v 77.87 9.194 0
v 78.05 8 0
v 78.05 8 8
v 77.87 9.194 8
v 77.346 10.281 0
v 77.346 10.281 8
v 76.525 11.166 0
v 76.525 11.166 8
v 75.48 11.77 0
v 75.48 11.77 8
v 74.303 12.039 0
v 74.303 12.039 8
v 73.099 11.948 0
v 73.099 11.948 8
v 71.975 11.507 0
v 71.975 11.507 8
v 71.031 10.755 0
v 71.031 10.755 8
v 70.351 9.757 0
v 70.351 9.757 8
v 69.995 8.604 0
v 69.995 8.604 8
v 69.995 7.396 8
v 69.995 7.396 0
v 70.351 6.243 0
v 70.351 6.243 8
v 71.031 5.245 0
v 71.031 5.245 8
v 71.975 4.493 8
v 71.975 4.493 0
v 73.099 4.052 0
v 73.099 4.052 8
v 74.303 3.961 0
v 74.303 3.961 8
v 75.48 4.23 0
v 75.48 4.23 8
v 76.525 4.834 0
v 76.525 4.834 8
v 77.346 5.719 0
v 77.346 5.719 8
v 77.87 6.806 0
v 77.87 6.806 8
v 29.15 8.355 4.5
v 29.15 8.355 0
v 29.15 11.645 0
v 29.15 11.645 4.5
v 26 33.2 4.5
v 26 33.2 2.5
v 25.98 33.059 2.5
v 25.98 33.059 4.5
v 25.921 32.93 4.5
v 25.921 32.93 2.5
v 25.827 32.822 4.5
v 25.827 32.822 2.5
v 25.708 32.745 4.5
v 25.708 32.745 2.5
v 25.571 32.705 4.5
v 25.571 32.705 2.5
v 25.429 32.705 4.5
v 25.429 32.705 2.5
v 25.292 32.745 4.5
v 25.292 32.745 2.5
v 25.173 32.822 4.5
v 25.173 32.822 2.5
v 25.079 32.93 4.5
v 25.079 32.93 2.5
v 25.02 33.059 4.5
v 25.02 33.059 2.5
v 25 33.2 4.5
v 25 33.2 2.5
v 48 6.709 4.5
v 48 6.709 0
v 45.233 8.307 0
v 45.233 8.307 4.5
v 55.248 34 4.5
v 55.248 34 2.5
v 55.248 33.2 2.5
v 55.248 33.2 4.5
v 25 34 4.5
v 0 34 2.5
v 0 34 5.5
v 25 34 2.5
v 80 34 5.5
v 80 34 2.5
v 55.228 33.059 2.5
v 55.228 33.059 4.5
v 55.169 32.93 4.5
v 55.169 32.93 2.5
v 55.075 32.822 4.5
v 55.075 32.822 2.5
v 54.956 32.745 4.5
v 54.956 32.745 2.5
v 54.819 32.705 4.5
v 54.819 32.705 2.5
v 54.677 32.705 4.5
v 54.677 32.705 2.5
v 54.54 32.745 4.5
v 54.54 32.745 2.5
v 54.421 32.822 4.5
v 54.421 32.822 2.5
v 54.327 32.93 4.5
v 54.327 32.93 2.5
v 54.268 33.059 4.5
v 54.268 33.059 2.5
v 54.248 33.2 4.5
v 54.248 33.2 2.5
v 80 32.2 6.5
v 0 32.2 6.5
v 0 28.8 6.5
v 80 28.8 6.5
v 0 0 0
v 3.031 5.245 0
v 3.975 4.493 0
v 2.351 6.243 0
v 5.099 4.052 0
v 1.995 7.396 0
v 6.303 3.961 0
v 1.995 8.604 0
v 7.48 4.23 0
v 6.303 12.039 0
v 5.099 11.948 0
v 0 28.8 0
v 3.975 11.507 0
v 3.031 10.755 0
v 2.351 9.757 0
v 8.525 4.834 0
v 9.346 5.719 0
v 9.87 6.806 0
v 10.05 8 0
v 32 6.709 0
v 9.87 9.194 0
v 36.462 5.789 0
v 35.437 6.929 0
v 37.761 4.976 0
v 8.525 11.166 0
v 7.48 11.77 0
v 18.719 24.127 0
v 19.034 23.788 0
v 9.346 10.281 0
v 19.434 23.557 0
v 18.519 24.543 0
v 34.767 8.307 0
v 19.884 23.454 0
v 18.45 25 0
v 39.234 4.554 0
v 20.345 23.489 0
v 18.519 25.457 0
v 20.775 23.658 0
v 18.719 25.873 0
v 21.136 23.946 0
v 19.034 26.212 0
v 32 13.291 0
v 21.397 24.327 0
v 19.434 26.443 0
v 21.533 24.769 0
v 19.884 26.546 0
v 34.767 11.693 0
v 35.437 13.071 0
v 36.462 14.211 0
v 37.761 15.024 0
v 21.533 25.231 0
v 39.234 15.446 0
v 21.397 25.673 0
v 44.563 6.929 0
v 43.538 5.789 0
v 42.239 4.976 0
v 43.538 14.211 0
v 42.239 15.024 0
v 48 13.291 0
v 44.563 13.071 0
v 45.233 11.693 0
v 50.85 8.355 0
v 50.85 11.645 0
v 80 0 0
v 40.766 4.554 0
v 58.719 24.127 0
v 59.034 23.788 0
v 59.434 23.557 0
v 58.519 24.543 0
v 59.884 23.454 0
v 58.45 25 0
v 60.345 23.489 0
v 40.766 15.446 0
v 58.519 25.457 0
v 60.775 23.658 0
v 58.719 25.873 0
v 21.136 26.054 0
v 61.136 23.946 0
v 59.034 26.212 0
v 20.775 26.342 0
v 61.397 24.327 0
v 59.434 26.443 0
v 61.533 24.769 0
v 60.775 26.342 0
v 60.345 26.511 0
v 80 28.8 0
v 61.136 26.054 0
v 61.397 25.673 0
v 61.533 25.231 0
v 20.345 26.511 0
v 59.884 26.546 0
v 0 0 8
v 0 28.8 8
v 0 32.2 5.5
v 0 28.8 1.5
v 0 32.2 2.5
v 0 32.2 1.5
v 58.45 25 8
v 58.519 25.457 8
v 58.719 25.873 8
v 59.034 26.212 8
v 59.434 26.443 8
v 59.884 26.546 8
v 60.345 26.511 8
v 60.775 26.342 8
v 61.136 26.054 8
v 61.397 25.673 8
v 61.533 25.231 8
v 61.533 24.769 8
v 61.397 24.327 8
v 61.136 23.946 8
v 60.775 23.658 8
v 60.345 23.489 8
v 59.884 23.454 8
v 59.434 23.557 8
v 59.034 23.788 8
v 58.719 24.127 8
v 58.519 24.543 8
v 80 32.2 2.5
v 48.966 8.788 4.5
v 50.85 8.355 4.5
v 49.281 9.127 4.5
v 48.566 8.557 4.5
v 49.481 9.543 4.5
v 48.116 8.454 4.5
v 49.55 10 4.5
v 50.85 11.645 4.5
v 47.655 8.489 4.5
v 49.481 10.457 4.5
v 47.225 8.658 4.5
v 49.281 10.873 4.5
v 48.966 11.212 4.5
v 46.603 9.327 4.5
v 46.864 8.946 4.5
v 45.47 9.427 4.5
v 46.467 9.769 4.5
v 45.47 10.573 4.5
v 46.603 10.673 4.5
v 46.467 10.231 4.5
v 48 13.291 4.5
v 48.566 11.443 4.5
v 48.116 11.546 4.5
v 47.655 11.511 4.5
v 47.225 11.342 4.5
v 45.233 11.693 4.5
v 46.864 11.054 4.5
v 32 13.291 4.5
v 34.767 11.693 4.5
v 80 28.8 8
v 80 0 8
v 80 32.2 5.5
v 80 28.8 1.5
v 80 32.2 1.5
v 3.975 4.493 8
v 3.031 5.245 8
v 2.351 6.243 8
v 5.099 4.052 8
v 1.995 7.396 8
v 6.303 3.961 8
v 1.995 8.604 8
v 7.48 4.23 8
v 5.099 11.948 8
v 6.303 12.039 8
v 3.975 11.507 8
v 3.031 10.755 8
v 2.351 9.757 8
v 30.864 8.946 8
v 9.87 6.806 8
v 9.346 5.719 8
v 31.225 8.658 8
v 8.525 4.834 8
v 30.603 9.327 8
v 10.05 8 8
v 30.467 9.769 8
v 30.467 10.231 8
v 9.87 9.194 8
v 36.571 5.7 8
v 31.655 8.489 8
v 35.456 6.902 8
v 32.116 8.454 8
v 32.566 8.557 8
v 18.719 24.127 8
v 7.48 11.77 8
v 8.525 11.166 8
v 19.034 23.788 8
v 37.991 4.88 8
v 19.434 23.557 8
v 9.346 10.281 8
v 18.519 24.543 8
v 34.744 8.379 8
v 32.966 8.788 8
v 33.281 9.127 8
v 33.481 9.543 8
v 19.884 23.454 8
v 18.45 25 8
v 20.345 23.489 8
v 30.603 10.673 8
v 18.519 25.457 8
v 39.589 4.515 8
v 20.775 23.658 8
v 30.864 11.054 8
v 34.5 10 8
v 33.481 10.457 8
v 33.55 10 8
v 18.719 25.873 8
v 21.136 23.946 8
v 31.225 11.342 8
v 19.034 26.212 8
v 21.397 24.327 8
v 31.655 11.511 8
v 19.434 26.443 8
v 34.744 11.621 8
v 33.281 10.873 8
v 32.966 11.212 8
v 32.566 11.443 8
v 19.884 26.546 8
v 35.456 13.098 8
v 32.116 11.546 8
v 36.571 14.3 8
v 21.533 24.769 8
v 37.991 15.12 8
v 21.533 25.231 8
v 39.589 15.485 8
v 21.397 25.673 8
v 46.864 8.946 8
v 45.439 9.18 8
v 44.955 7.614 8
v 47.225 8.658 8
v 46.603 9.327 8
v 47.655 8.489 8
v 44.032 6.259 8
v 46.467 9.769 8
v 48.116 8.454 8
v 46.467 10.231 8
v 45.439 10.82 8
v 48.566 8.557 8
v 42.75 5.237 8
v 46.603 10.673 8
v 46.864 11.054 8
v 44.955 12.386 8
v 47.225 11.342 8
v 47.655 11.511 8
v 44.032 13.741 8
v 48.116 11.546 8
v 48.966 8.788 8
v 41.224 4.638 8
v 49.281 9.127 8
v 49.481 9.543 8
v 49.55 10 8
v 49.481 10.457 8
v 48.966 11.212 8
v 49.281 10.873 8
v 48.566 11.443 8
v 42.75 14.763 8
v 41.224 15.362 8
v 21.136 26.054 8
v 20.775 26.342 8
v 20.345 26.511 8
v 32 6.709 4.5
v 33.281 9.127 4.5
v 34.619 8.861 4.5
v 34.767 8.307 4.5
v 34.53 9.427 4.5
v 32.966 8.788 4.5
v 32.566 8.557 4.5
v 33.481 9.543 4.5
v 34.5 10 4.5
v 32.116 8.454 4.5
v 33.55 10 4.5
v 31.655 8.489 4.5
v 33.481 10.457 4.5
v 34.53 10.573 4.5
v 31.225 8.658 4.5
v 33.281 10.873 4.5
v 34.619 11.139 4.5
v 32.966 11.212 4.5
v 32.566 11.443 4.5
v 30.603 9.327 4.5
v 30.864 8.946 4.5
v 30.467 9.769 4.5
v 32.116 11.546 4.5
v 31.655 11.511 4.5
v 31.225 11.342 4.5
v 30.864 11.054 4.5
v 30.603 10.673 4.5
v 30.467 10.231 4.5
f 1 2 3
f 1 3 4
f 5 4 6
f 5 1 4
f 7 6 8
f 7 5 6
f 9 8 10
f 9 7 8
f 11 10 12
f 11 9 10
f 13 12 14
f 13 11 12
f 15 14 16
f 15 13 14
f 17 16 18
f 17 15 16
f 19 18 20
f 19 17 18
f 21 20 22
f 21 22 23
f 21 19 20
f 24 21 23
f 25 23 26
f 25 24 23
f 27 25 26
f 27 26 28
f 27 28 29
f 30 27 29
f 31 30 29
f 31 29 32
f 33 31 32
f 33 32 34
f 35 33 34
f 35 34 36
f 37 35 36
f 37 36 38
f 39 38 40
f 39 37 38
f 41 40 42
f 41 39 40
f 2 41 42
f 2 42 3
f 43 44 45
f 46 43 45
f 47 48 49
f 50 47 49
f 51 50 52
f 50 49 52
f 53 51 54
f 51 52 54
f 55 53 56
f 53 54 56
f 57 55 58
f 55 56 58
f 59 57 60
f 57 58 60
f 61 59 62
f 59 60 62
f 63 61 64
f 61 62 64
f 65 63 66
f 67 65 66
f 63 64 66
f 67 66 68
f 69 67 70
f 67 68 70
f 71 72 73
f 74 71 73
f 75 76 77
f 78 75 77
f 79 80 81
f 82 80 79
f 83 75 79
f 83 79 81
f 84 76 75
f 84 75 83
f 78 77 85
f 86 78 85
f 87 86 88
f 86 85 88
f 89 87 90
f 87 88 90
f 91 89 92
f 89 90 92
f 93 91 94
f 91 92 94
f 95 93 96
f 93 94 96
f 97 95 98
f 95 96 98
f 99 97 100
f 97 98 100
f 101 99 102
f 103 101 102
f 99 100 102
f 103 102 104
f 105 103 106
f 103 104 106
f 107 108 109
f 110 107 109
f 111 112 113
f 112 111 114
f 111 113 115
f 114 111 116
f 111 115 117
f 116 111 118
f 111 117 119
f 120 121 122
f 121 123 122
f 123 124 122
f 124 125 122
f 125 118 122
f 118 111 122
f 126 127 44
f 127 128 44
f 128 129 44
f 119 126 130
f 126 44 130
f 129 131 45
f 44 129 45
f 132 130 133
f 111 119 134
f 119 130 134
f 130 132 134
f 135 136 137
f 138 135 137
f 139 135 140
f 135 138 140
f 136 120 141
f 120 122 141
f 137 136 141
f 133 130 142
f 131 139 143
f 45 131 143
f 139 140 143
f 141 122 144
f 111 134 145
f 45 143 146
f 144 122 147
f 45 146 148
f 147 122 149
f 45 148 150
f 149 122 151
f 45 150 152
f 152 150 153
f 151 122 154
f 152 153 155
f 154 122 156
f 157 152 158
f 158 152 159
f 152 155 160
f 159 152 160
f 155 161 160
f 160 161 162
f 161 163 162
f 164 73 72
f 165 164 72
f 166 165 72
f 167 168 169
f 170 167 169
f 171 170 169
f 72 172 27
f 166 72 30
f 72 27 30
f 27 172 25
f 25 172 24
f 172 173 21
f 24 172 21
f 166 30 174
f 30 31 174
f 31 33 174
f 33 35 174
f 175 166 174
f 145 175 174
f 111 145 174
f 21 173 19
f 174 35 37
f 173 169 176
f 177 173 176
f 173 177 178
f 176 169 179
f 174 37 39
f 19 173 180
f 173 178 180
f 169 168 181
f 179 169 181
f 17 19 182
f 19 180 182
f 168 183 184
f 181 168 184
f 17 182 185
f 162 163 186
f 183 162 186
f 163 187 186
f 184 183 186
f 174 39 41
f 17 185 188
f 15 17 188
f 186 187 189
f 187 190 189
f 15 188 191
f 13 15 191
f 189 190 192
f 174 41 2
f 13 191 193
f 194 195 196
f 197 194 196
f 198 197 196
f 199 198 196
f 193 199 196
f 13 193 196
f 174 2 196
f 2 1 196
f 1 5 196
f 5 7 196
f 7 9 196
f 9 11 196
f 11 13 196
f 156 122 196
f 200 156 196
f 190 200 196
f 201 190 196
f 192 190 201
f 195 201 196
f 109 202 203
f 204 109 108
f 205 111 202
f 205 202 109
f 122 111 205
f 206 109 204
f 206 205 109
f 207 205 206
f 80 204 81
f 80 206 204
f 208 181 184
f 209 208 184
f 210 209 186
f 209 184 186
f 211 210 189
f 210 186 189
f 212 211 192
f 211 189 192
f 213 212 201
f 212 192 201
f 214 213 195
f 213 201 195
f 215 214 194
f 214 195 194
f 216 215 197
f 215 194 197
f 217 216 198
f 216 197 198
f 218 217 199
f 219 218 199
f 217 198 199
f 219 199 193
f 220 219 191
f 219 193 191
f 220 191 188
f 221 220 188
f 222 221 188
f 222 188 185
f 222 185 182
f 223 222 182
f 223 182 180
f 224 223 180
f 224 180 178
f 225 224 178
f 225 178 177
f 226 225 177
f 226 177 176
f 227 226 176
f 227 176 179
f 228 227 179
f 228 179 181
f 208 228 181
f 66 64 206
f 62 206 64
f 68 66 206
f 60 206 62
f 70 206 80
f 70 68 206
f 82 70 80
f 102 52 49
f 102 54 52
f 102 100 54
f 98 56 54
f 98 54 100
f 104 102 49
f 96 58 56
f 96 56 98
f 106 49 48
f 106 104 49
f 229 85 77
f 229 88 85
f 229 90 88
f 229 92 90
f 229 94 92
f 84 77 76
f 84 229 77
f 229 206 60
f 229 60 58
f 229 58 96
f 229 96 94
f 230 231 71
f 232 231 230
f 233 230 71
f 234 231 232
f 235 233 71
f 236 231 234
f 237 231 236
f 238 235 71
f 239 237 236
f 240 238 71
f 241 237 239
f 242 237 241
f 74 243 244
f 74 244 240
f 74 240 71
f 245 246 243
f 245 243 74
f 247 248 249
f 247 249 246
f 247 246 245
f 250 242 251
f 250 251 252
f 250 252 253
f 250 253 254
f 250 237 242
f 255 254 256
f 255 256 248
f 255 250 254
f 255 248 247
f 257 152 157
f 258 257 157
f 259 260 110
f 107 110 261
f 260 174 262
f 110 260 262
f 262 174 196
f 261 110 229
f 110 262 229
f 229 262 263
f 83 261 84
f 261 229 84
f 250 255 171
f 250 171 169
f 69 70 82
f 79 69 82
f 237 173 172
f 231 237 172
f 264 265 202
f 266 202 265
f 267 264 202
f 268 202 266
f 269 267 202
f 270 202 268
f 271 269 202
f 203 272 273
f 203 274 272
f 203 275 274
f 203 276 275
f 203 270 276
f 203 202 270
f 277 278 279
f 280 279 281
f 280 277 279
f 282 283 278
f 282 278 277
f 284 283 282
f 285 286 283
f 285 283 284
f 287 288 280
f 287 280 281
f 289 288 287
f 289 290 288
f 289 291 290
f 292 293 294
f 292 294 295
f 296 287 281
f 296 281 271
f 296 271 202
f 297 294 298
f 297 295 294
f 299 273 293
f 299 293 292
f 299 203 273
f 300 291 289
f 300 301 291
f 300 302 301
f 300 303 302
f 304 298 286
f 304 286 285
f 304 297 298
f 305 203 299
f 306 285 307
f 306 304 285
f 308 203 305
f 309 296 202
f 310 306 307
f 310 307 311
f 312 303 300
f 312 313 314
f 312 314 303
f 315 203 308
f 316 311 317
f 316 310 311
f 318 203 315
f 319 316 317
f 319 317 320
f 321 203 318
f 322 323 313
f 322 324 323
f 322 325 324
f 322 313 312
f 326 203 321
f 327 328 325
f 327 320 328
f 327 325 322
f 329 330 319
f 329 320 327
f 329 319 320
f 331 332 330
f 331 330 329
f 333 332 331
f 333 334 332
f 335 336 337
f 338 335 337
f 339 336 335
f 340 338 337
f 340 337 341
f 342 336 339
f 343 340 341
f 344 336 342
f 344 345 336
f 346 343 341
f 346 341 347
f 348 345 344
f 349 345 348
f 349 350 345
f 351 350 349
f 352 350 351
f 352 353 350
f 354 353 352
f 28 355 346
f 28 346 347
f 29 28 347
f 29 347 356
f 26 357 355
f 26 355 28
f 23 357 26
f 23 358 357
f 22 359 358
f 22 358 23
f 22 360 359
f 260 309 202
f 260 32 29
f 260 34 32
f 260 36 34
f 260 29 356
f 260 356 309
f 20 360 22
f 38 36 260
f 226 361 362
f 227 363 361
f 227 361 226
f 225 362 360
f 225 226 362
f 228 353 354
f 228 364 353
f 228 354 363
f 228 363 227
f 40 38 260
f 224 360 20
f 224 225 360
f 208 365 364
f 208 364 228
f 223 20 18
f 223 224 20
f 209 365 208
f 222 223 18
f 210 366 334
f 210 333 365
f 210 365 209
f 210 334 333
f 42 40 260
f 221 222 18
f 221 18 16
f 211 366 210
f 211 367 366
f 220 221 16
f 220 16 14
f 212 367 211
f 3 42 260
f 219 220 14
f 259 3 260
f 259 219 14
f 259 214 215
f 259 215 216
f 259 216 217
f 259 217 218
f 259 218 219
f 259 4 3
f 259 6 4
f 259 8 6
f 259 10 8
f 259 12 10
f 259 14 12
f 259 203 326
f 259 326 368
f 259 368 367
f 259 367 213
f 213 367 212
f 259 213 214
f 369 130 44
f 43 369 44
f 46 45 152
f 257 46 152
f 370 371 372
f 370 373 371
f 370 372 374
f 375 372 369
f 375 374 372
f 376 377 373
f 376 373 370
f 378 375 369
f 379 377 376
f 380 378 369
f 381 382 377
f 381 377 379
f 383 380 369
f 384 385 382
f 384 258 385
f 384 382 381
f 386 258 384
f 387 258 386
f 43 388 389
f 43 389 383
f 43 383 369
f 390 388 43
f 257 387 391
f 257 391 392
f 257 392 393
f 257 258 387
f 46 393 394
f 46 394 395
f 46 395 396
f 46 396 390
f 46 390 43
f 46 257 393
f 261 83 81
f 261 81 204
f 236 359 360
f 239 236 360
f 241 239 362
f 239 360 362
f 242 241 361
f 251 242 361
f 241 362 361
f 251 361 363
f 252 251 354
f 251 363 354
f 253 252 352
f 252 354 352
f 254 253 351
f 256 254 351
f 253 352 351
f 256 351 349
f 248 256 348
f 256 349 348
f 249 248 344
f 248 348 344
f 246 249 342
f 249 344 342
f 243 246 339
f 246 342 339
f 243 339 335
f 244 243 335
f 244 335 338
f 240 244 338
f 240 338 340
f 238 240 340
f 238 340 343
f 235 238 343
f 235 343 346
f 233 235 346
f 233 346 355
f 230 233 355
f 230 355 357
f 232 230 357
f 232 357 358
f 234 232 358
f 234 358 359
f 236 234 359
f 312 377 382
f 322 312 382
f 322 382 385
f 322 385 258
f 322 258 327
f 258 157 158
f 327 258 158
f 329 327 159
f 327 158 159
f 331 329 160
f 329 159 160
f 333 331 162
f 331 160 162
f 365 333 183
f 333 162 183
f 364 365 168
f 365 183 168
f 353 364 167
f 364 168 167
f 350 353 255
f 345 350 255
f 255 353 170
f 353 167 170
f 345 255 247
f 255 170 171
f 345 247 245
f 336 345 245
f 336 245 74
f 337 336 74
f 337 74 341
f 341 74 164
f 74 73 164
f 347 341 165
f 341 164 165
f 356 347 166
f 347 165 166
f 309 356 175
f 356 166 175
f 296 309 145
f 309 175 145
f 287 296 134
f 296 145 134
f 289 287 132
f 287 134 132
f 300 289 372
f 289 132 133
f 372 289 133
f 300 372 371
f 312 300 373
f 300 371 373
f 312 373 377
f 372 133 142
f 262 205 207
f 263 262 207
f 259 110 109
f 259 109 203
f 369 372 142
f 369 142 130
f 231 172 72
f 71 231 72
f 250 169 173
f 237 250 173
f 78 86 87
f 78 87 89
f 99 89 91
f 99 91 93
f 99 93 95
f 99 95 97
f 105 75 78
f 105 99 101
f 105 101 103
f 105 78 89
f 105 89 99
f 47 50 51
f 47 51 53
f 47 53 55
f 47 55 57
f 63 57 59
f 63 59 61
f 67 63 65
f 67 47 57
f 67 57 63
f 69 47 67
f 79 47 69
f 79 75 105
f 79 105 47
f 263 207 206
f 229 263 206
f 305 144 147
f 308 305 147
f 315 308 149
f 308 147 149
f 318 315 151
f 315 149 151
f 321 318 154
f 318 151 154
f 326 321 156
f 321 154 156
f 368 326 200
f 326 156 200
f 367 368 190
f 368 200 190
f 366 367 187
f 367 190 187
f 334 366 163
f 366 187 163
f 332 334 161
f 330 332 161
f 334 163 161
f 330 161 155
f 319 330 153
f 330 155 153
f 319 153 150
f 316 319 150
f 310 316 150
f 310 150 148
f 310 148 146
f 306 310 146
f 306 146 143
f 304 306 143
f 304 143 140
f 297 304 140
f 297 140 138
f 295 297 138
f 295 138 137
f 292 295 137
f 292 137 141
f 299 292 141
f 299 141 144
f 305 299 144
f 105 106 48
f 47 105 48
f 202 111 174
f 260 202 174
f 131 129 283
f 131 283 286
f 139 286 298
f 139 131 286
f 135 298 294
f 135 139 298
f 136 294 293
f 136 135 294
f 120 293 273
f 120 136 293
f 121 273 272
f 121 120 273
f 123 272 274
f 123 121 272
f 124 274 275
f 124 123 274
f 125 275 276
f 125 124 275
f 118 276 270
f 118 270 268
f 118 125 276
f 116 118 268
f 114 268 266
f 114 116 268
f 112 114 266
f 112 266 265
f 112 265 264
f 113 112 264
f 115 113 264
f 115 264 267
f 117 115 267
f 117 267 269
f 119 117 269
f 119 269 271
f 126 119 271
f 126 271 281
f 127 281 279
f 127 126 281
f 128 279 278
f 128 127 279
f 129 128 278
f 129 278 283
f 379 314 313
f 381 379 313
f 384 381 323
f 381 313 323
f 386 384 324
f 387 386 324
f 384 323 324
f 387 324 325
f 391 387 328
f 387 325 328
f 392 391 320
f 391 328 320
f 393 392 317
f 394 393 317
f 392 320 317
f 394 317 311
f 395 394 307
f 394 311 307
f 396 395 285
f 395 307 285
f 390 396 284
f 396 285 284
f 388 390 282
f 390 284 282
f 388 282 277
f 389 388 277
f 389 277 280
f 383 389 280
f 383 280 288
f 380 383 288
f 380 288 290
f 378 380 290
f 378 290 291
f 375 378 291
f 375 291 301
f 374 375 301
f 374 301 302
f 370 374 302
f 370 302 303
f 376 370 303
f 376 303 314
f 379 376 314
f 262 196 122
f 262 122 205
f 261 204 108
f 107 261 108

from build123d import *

# Parameters (mm, degrees)
SKETCH_2_W           = 80
SKETCH_2_H           = 34
SKETCH_2_R           = 4.05
EXTRUDE_1_DEPTH      = 8
CUT_EXTRUDE_2_DEPTH  = 88.292611371
SKETCH_5_R           = 1.55
CUT_EXTRUDE_3_DEPTH  = 88.292611371
CUT_EXTRUDE_5_DEPTH  = 4.5
SKETCH_11_R          = 1.55
CUT_EXTRUDE_7_DEPTH  = 88.292611371
CUT_EXTRUDE_11_DEPTH = 2
SKETCH_20_R          = 5.5
CUT_EXTRUDE_14_DEPTH = 88.292611371


with BuildPart() as part:
    # 草图2 → 凸台-拉伸1 (new body)
    with BuildSketch(Plane.XY):
        with Locations((40, 17)):
            Rectangle(SKETCH_2_W, SKETCH_2_H)
        with Locations((6, 8)):
            Circle(SKETCH_2_R, mode=Mode.SUBTRACT)
        with Locations((40, 10)):
            Circle(SKETCH_2_R, mode=Mode.SUBTRACT)
        with Locations((74, 8)):
            Circle(SKETCH_2_R, mode=Mode.SUBTRACT)
    extrude(amount=EXTRUDE_1_DEPTH)

    # 草图4 → 切除-拉伸2 (cut, through all)
    with BuildSketch(Plane(origin=(80, 0, 0), x_dir=(0, 0, -1), z_dir=(1, 0, 0))):
        Polygon((-1.5, 32.2), (-2.5, 32.2), (-2.5, 34), (0, 34), (0, 28.8), (-1.5, 28.8), align=None)
        Polygon((-6.5, 32.2), (-6.5, 28.8), (-8, 28.8), (-8, 34), (-5.5, 34), (-5.5, 32.2), align=None)
    extrude(amount=-CUT_EXTRUDE_2_DEPTH, mode=Mode.SUBTRACT)

    # 草图5 → 切除-拉伸3 (cut, through all)
    with BuildSketch(Plane.XY.offset(8)):
        with Locations((48, 10)):
            Circle(SKETCH_5_R)
        with Locations((32, 10)):
            Circle(SKETCH_5_R)
    extrude(amount=-CUT_EXTRUDE_3_DEPTH, mode=Mode.SUBTRACT)

    # 草图8 → 切除-拉伸5 (cut)
    with BuildSketch(Plane(origin=(0, 0, 0), x_dir=(-1, 0, 0), z_dir=(0, 0, -1))):
        Polygon((-45.15, 8.354551733), (-45.15, 11.645448267), (-48, 13.290896534), (-50.85, 11.645448267), (-50.85, 8.354551733), (-48, 6.709103466), align=None)
        Polygon((-29.15, 8.354551733), (-29.15, 11.645448267), (-32, 13.290896534), (-34.85, 11.645448267), (-34.85, 8.354551733), (-32, 6.709103466), align=None)
    extrude(amount=-CUT_EXTRUDE_5_DEPTH, mode=Mode.SUBTRACT)

    # 草图11 → 切除-拉伸7 (cut, through all)
    with BuildSketch(Plane(origin=(0, 0, 0), x_dir=(-1, 0, 0), z_dir=(0, 0, -1))):
        with Locations((-60, 25)):
            Circle(SKETCH_11_R)
        with Locations((-20, 25)):
            Circle(SKETCH_11_R)
    extrude(amount=-CUT_EXTRUDE_7_DEPTH, mode=Mode.SUBTRACT)

    # 草图19 → 切除-拉伸11 (cut)
    with BuildSketch(Plane(origin=(0, 0, 2.5), x_dir=(-1, 0, 0), z_dir=(0, 0, -1))):
        with BuildLine():
            Line((-25, 34), (-55.247938178, 34))
            Line((-55.247938178, 34), (-55.247938178, 33.2))
            ThreePointArc((-55.247938178, 33.2), (-54.747938178, 32.7), (-54.247938178, 33.2))
            Line((-54.247938178, 33.2), (-26, 33.2))
            ThreePointArc((-26, 33.2), (-25.5, 32.7), (-25, 33.2))
            Line((-25, 33.2), (-25, 34))
        make_face()
    extrude(amount=-CUT_EXTRUDE_11_DEPTH, mode=Mode.SUBTRACT)

    # 草图20 → 切除-拉伸14 (cut, through all)
    with BuildSketch(Plane(origin=(0, 0, 0), x_dir=(-1, 0, 0), z_dir=(0, 0, -1))):
        with Locations((-40, 10)):
            Circle(SKETCH_20_R)
    extrude(amount=-CUT_EXTRUDE_14_DEPTH, mode=Mode.SUBTRACT)


solid = part.part
